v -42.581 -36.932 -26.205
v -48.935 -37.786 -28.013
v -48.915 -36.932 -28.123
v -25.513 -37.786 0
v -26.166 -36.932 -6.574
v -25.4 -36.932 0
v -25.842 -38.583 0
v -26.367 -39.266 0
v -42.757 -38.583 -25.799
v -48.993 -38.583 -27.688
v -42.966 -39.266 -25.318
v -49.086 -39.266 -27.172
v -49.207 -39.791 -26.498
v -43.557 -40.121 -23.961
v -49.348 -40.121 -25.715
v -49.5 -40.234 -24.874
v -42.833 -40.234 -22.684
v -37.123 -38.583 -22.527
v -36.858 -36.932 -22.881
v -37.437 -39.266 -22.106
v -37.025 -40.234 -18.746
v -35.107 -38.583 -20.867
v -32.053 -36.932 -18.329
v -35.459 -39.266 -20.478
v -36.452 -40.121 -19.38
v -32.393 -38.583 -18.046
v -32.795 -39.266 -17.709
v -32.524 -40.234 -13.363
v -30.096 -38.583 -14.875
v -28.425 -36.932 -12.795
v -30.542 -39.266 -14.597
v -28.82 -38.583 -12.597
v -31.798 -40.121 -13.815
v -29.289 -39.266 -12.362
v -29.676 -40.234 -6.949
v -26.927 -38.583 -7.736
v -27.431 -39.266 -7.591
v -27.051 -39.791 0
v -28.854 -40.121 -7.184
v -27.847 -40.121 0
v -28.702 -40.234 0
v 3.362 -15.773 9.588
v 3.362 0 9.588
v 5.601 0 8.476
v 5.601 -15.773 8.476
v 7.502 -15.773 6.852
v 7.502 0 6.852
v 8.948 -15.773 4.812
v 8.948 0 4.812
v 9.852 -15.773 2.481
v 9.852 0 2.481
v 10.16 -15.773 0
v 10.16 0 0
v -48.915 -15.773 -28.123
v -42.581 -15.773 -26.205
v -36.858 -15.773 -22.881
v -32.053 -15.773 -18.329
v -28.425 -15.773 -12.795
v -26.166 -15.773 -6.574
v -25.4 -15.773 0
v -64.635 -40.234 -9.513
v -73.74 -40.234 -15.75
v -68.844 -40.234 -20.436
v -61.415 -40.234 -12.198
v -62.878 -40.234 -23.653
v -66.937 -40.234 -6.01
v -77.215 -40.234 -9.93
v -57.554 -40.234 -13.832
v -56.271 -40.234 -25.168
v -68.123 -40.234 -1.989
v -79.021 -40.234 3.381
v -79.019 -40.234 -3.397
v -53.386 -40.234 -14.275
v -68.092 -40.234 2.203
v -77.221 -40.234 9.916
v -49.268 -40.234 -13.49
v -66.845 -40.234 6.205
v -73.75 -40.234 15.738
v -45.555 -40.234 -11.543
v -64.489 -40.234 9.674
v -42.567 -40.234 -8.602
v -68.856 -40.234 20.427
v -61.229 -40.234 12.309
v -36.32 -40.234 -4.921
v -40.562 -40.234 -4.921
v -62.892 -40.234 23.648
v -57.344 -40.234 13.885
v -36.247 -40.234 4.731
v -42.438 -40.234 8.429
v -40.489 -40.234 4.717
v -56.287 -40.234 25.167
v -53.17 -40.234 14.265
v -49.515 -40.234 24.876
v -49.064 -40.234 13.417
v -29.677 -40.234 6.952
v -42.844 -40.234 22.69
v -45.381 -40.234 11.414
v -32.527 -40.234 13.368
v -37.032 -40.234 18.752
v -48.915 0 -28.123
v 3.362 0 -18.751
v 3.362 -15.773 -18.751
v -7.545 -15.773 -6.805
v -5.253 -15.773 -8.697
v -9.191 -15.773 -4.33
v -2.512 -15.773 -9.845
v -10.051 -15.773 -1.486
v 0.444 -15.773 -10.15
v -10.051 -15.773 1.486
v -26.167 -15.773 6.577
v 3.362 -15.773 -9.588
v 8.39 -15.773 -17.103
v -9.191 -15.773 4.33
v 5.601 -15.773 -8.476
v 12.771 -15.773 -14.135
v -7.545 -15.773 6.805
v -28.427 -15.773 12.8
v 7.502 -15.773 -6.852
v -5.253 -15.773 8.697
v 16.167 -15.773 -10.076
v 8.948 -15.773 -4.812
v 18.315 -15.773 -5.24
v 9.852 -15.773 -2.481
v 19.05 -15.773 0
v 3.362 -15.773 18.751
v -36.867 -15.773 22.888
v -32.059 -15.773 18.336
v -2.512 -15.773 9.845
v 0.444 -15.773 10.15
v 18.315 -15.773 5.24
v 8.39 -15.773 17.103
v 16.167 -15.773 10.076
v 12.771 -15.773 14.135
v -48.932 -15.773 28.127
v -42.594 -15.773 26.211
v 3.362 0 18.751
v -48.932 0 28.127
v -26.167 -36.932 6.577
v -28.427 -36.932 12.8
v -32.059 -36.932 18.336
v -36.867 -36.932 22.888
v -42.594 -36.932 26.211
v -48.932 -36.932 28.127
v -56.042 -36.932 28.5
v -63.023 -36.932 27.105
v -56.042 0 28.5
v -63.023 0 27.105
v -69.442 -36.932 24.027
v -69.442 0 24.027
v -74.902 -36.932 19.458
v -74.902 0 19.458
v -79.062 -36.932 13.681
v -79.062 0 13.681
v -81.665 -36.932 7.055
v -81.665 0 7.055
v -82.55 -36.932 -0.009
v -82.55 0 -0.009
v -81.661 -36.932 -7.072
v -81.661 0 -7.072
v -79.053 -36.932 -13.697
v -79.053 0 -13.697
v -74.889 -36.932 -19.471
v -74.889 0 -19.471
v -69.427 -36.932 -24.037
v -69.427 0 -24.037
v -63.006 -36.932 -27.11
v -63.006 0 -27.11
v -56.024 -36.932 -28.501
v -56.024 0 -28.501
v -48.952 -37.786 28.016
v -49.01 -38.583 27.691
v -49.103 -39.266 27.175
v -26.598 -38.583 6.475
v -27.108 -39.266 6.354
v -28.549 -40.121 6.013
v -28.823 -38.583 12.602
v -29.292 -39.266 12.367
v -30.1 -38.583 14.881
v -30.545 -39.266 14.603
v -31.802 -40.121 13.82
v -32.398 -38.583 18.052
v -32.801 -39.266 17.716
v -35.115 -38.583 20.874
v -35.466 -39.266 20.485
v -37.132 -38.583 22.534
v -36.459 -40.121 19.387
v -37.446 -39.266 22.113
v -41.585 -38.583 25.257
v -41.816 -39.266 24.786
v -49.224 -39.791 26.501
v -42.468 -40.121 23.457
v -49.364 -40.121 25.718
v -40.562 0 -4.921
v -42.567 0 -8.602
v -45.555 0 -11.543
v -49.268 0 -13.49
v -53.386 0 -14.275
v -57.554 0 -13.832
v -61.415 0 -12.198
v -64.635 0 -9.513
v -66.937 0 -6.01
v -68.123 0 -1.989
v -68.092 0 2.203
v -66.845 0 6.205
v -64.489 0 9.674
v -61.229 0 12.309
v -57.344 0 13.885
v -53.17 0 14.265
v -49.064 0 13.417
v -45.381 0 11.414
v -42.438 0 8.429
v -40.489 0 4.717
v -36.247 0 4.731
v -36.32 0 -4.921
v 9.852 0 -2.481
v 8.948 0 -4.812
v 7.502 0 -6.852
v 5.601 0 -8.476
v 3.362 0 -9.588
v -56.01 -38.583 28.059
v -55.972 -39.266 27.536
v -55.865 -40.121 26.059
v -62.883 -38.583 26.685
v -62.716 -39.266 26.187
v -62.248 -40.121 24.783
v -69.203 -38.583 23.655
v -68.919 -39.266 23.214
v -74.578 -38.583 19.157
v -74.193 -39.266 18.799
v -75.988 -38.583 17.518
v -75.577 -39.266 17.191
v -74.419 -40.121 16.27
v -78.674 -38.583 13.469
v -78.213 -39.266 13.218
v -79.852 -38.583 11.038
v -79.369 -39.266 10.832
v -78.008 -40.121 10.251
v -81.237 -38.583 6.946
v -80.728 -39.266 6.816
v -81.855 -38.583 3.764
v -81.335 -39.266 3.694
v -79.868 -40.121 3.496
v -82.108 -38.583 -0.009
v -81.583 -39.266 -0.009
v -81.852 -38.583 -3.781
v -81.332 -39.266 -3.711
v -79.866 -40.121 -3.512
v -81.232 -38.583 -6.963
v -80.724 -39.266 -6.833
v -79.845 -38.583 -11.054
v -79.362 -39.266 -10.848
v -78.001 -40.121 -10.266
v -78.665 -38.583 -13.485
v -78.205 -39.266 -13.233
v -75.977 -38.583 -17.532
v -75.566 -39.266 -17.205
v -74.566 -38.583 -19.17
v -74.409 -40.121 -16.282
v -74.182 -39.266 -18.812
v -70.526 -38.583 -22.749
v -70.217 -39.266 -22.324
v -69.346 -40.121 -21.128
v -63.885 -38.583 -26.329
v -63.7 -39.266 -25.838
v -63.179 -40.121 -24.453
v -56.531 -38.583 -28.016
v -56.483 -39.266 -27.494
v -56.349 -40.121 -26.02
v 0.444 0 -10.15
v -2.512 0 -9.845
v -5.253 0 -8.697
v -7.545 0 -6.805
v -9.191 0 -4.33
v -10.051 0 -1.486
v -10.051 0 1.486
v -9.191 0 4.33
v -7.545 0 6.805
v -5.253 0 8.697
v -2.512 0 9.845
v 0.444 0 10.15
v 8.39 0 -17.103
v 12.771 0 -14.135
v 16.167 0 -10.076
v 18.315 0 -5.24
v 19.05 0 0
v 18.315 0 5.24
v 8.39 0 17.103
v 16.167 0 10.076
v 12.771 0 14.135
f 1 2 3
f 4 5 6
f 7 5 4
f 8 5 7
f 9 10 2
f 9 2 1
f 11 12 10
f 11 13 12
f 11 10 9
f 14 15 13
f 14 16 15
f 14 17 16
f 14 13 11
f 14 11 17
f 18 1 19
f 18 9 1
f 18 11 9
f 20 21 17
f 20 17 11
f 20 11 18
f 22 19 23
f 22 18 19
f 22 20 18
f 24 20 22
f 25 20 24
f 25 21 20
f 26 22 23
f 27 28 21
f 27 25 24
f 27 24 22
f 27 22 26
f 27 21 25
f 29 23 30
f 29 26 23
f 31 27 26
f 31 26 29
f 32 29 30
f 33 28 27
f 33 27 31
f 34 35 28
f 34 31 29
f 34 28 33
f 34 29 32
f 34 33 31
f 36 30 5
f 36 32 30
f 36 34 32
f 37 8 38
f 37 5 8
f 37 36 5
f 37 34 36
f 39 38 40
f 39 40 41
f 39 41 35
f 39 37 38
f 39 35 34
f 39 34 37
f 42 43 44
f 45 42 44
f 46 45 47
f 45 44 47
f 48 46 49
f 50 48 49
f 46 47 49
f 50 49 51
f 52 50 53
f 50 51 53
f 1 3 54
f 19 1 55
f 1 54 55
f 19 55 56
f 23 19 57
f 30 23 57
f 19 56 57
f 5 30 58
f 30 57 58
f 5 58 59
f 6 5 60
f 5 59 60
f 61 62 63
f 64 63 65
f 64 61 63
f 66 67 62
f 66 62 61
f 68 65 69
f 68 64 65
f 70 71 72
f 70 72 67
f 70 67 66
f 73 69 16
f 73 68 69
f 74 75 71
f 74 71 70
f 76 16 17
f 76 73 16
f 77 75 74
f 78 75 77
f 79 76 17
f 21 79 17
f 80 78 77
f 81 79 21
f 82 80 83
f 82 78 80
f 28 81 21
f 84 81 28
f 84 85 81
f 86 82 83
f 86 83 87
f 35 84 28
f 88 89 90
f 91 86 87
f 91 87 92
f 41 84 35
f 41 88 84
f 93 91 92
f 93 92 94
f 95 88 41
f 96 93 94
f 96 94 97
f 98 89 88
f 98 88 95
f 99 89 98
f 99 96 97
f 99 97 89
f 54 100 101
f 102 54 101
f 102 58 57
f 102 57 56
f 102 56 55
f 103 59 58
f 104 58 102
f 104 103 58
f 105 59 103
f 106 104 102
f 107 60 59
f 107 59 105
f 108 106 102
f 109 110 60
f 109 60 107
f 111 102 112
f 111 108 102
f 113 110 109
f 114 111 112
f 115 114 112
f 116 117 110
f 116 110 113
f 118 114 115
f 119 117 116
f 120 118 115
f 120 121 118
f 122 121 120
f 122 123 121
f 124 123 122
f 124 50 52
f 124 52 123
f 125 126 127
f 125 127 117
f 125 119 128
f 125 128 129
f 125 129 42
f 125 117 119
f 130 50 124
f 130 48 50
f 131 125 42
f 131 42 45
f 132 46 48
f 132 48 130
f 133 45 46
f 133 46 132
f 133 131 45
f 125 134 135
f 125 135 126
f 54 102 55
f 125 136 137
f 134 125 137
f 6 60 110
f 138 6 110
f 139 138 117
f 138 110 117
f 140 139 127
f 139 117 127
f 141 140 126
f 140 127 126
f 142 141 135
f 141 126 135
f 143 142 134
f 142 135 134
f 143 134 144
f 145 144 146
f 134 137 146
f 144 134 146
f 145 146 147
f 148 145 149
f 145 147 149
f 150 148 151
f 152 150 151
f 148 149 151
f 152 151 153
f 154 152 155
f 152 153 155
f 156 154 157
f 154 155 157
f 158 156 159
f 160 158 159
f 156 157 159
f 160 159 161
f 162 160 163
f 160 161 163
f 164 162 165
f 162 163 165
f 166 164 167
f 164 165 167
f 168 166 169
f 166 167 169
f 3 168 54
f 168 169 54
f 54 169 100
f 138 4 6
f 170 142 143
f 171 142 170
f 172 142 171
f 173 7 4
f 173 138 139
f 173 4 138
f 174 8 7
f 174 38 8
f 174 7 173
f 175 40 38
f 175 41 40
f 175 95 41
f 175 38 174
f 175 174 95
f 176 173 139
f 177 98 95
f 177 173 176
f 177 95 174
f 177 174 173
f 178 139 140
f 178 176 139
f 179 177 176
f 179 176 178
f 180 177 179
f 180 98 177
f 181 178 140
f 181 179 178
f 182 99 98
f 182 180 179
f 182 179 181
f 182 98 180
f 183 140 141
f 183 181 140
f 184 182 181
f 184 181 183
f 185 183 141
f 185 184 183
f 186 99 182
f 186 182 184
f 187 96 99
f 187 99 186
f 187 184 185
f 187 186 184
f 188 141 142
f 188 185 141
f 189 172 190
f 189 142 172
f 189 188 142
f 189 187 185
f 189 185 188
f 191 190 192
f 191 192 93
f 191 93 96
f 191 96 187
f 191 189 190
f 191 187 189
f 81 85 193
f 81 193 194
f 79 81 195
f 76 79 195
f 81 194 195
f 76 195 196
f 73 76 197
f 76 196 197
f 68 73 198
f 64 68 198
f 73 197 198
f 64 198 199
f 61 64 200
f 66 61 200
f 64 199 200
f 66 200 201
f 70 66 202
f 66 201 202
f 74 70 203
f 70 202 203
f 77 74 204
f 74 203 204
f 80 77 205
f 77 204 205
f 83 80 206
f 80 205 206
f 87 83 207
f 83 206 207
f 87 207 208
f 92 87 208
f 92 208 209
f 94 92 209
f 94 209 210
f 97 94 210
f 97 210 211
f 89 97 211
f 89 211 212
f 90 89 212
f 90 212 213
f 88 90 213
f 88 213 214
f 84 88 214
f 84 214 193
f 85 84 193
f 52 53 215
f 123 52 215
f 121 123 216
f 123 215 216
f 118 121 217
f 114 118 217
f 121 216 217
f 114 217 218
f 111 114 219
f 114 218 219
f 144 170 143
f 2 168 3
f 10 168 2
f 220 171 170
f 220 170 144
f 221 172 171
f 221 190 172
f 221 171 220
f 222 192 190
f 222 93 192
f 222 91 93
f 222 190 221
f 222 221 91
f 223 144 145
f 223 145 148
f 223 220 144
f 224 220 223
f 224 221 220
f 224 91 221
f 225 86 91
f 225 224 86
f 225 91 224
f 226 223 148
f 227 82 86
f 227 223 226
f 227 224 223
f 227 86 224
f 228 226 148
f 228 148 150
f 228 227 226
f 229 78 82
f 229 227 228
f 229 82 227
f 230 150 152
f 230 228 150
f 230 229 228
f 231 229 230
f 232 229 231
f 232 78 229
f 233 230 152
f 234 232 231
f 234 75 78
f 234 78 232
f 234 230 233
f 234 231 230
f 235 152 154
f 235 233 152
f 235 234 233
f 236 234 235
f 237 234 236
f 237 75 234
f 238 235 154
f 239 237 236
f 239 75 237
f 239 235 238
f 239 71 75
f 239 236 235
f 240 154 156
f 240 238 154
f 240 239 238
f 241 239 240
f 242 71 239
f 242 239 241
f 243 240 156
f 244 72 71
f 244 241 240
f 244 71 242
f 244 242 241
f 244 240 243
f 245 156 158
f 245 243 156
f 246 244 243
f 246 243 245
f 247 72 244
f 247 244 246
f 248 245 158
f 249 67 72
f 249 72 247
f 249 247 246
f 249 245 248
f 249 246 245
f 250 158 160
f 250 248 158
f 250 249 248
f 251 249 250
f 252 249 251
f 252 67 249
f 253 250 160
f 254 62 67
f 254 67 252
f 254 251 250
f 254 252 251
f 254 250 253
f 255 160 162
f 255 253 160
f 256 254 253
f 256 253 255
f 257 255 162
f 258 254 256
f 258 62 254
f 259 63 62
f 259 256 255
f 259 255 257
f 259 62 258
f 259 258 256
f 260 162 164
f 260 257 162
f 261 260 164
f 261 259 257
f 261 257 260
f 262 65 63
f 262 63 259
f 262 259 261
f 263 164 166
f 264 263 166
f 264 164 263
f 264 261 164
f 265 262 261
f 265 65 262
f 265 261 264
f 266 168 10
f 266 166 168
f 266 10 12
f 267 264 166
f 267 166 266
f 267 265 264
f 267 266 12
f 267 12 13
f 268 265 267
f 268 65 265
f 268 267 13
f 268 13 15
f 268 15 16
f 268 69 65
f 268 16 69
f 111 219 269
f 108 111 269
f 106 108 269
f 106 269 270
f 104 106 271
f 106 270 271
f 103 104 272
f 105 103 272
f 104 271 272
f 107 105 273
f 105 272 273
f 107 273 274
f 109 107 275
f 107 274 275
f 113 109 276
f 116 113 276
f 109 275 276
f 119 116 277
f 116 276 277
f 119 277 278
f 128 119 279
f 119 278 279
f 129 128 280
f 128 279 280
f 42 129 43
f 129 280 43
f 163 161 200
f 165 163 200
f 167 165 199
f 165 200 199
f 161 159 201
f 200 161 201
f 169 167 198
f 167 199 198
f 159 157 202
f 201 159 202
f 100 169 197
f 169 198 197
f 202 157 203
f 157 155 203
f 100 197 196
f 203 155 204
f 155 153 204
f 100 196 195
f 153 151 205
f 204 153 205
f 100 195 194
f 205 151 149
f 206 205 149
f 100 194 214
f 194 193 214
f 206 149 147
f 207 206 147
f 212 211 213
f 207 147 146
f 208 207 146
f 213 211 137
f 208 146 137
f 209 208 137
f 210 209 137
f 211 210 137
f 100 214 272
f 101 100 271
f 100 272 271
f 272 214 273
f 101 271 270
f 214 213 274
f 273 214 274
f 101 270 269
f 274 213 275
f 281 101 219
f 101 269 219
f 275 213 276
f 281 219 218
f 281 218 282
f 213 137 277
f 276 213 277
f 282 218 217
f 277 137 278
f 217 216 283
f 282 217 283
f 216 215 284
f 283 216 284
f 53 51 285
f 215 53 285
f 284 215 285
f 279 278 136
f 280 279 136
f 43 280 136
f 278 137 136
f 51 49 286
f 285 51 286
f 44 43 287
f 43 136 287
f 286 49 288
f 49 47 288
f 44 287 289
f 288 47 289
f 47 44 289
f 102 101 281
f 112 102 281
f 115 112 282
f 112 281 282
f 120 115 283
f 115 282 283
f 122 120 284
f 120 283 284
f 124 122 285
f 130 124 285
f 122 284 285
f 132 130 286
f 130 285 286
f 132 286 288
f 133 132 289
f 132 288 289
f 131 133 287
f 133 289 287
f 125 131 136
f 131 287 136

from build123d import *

# Parameters (mm, degrees)
F0_R     = 25.4
F1_DEPTH = 40.2336
F2_DEPTH = 15.7734
F3_R     = 3.302


with BuildPart() as f1:
    # F0 (on Front) → F1 (new body)
    with BuildSketch(Plane.XZ):
        with BuildLine():
            ThreePointArc((-48.9148357547, -28.1233952931), (-32.0532662831, -18.3294357754), (-25.4, 0))
            ThreePointArc((-25.4, 0), (-32.0589754437, 18.3362616868), (-48.9323529412, 28.1265414802))
            ThreePointArc((-48.9323529412, 28.1265414802), (-82.5499986144, -0.0088987403), (-48.9148357547, -28.1233952931))
        make_face()
        with Locations((-53.975, 0)):
            Circle(F0_R, mode=Mode.SUBTRACT)
        with Locations((-53.975, 0)):
            Circle(F0_R)
        with BuildLine():
            ThreePointArc((-40.5617797533, -4.9211968934), (-68.262089785, 0.1082669213), (-40.488739251, 4.717353841))
            Line((-40.488739251, 4.717353841), (-36.2469597058, 4.7305268942))
            Line((-36.2469597058, 4.7305268942), (-36.3199797533, -4.9211968934))
            Line((-36.3199797533, -4.9211968934), (-40.5617797533, -4.9211968934))
        make_face(mode=Mode.SUBTRACT)
    extrude(amount=F1_DEPTH)

    # F0 (on Front) → F2 (join)
    with BuildSketch(Plane.XZ):
        with BuildLine():
            ThreePointArc((3.3617647059, -18.7510276535), (19.05, 0), (3.3617647059, 18.7510276535))
            Line((3.3617647059, 18.7510276535), (3.3617647059, 9.5877076542))
            ThreePointArc((3.3617647059, 9.5877076542), (8.2879771178, 5.8766517077), (10.16, 0))
            ThreePointArc((10.16, 0), (8.2879771178, -5.8766517077), (3.3617647059, -9.5877076542))
            Line((3.3617647059, -9.5877076542), (3.3617647059, -18.7510276535))
        make_face()
        with BuildLine():
            ThreePointArc((-48.9323529412, 28.1265414802), (-32.0589754437, 18.3362616868), (-25.4, 0))
            ThreePointArc((-25.4, 0), (-32.0532662831, -18.3294357754), (-48.9148357547, -28.1233952931))
            Line((-48.9148357547, -28.1233952931), (3.3617647059, -18.7510276535))
            Line((3.3617647059, -18.7510276535), (3.3617647059, -9.5877076542))
            ThreePointArc((3.3617647059, -9.5877076542), (-10.16, 0), (3.3617647059, 9.5877076542))
            Line((3.3617647059, 9.5877076542), (3.3617647059, 18.7510276535))
            Line((3.3617647059, 18.7510276535), (-48.9323529412, 28.1265414802))
        make_face()
    extrude(amount=F2_DEPTH)

    # F3
    f3_edges = [f1.edges().sort_by_distance(p)[0] for p in [
        (-82.55, -40.2336, 0),
    ]]
    fillet(f3_edges, radius=F3_R)


solid = f1.part
